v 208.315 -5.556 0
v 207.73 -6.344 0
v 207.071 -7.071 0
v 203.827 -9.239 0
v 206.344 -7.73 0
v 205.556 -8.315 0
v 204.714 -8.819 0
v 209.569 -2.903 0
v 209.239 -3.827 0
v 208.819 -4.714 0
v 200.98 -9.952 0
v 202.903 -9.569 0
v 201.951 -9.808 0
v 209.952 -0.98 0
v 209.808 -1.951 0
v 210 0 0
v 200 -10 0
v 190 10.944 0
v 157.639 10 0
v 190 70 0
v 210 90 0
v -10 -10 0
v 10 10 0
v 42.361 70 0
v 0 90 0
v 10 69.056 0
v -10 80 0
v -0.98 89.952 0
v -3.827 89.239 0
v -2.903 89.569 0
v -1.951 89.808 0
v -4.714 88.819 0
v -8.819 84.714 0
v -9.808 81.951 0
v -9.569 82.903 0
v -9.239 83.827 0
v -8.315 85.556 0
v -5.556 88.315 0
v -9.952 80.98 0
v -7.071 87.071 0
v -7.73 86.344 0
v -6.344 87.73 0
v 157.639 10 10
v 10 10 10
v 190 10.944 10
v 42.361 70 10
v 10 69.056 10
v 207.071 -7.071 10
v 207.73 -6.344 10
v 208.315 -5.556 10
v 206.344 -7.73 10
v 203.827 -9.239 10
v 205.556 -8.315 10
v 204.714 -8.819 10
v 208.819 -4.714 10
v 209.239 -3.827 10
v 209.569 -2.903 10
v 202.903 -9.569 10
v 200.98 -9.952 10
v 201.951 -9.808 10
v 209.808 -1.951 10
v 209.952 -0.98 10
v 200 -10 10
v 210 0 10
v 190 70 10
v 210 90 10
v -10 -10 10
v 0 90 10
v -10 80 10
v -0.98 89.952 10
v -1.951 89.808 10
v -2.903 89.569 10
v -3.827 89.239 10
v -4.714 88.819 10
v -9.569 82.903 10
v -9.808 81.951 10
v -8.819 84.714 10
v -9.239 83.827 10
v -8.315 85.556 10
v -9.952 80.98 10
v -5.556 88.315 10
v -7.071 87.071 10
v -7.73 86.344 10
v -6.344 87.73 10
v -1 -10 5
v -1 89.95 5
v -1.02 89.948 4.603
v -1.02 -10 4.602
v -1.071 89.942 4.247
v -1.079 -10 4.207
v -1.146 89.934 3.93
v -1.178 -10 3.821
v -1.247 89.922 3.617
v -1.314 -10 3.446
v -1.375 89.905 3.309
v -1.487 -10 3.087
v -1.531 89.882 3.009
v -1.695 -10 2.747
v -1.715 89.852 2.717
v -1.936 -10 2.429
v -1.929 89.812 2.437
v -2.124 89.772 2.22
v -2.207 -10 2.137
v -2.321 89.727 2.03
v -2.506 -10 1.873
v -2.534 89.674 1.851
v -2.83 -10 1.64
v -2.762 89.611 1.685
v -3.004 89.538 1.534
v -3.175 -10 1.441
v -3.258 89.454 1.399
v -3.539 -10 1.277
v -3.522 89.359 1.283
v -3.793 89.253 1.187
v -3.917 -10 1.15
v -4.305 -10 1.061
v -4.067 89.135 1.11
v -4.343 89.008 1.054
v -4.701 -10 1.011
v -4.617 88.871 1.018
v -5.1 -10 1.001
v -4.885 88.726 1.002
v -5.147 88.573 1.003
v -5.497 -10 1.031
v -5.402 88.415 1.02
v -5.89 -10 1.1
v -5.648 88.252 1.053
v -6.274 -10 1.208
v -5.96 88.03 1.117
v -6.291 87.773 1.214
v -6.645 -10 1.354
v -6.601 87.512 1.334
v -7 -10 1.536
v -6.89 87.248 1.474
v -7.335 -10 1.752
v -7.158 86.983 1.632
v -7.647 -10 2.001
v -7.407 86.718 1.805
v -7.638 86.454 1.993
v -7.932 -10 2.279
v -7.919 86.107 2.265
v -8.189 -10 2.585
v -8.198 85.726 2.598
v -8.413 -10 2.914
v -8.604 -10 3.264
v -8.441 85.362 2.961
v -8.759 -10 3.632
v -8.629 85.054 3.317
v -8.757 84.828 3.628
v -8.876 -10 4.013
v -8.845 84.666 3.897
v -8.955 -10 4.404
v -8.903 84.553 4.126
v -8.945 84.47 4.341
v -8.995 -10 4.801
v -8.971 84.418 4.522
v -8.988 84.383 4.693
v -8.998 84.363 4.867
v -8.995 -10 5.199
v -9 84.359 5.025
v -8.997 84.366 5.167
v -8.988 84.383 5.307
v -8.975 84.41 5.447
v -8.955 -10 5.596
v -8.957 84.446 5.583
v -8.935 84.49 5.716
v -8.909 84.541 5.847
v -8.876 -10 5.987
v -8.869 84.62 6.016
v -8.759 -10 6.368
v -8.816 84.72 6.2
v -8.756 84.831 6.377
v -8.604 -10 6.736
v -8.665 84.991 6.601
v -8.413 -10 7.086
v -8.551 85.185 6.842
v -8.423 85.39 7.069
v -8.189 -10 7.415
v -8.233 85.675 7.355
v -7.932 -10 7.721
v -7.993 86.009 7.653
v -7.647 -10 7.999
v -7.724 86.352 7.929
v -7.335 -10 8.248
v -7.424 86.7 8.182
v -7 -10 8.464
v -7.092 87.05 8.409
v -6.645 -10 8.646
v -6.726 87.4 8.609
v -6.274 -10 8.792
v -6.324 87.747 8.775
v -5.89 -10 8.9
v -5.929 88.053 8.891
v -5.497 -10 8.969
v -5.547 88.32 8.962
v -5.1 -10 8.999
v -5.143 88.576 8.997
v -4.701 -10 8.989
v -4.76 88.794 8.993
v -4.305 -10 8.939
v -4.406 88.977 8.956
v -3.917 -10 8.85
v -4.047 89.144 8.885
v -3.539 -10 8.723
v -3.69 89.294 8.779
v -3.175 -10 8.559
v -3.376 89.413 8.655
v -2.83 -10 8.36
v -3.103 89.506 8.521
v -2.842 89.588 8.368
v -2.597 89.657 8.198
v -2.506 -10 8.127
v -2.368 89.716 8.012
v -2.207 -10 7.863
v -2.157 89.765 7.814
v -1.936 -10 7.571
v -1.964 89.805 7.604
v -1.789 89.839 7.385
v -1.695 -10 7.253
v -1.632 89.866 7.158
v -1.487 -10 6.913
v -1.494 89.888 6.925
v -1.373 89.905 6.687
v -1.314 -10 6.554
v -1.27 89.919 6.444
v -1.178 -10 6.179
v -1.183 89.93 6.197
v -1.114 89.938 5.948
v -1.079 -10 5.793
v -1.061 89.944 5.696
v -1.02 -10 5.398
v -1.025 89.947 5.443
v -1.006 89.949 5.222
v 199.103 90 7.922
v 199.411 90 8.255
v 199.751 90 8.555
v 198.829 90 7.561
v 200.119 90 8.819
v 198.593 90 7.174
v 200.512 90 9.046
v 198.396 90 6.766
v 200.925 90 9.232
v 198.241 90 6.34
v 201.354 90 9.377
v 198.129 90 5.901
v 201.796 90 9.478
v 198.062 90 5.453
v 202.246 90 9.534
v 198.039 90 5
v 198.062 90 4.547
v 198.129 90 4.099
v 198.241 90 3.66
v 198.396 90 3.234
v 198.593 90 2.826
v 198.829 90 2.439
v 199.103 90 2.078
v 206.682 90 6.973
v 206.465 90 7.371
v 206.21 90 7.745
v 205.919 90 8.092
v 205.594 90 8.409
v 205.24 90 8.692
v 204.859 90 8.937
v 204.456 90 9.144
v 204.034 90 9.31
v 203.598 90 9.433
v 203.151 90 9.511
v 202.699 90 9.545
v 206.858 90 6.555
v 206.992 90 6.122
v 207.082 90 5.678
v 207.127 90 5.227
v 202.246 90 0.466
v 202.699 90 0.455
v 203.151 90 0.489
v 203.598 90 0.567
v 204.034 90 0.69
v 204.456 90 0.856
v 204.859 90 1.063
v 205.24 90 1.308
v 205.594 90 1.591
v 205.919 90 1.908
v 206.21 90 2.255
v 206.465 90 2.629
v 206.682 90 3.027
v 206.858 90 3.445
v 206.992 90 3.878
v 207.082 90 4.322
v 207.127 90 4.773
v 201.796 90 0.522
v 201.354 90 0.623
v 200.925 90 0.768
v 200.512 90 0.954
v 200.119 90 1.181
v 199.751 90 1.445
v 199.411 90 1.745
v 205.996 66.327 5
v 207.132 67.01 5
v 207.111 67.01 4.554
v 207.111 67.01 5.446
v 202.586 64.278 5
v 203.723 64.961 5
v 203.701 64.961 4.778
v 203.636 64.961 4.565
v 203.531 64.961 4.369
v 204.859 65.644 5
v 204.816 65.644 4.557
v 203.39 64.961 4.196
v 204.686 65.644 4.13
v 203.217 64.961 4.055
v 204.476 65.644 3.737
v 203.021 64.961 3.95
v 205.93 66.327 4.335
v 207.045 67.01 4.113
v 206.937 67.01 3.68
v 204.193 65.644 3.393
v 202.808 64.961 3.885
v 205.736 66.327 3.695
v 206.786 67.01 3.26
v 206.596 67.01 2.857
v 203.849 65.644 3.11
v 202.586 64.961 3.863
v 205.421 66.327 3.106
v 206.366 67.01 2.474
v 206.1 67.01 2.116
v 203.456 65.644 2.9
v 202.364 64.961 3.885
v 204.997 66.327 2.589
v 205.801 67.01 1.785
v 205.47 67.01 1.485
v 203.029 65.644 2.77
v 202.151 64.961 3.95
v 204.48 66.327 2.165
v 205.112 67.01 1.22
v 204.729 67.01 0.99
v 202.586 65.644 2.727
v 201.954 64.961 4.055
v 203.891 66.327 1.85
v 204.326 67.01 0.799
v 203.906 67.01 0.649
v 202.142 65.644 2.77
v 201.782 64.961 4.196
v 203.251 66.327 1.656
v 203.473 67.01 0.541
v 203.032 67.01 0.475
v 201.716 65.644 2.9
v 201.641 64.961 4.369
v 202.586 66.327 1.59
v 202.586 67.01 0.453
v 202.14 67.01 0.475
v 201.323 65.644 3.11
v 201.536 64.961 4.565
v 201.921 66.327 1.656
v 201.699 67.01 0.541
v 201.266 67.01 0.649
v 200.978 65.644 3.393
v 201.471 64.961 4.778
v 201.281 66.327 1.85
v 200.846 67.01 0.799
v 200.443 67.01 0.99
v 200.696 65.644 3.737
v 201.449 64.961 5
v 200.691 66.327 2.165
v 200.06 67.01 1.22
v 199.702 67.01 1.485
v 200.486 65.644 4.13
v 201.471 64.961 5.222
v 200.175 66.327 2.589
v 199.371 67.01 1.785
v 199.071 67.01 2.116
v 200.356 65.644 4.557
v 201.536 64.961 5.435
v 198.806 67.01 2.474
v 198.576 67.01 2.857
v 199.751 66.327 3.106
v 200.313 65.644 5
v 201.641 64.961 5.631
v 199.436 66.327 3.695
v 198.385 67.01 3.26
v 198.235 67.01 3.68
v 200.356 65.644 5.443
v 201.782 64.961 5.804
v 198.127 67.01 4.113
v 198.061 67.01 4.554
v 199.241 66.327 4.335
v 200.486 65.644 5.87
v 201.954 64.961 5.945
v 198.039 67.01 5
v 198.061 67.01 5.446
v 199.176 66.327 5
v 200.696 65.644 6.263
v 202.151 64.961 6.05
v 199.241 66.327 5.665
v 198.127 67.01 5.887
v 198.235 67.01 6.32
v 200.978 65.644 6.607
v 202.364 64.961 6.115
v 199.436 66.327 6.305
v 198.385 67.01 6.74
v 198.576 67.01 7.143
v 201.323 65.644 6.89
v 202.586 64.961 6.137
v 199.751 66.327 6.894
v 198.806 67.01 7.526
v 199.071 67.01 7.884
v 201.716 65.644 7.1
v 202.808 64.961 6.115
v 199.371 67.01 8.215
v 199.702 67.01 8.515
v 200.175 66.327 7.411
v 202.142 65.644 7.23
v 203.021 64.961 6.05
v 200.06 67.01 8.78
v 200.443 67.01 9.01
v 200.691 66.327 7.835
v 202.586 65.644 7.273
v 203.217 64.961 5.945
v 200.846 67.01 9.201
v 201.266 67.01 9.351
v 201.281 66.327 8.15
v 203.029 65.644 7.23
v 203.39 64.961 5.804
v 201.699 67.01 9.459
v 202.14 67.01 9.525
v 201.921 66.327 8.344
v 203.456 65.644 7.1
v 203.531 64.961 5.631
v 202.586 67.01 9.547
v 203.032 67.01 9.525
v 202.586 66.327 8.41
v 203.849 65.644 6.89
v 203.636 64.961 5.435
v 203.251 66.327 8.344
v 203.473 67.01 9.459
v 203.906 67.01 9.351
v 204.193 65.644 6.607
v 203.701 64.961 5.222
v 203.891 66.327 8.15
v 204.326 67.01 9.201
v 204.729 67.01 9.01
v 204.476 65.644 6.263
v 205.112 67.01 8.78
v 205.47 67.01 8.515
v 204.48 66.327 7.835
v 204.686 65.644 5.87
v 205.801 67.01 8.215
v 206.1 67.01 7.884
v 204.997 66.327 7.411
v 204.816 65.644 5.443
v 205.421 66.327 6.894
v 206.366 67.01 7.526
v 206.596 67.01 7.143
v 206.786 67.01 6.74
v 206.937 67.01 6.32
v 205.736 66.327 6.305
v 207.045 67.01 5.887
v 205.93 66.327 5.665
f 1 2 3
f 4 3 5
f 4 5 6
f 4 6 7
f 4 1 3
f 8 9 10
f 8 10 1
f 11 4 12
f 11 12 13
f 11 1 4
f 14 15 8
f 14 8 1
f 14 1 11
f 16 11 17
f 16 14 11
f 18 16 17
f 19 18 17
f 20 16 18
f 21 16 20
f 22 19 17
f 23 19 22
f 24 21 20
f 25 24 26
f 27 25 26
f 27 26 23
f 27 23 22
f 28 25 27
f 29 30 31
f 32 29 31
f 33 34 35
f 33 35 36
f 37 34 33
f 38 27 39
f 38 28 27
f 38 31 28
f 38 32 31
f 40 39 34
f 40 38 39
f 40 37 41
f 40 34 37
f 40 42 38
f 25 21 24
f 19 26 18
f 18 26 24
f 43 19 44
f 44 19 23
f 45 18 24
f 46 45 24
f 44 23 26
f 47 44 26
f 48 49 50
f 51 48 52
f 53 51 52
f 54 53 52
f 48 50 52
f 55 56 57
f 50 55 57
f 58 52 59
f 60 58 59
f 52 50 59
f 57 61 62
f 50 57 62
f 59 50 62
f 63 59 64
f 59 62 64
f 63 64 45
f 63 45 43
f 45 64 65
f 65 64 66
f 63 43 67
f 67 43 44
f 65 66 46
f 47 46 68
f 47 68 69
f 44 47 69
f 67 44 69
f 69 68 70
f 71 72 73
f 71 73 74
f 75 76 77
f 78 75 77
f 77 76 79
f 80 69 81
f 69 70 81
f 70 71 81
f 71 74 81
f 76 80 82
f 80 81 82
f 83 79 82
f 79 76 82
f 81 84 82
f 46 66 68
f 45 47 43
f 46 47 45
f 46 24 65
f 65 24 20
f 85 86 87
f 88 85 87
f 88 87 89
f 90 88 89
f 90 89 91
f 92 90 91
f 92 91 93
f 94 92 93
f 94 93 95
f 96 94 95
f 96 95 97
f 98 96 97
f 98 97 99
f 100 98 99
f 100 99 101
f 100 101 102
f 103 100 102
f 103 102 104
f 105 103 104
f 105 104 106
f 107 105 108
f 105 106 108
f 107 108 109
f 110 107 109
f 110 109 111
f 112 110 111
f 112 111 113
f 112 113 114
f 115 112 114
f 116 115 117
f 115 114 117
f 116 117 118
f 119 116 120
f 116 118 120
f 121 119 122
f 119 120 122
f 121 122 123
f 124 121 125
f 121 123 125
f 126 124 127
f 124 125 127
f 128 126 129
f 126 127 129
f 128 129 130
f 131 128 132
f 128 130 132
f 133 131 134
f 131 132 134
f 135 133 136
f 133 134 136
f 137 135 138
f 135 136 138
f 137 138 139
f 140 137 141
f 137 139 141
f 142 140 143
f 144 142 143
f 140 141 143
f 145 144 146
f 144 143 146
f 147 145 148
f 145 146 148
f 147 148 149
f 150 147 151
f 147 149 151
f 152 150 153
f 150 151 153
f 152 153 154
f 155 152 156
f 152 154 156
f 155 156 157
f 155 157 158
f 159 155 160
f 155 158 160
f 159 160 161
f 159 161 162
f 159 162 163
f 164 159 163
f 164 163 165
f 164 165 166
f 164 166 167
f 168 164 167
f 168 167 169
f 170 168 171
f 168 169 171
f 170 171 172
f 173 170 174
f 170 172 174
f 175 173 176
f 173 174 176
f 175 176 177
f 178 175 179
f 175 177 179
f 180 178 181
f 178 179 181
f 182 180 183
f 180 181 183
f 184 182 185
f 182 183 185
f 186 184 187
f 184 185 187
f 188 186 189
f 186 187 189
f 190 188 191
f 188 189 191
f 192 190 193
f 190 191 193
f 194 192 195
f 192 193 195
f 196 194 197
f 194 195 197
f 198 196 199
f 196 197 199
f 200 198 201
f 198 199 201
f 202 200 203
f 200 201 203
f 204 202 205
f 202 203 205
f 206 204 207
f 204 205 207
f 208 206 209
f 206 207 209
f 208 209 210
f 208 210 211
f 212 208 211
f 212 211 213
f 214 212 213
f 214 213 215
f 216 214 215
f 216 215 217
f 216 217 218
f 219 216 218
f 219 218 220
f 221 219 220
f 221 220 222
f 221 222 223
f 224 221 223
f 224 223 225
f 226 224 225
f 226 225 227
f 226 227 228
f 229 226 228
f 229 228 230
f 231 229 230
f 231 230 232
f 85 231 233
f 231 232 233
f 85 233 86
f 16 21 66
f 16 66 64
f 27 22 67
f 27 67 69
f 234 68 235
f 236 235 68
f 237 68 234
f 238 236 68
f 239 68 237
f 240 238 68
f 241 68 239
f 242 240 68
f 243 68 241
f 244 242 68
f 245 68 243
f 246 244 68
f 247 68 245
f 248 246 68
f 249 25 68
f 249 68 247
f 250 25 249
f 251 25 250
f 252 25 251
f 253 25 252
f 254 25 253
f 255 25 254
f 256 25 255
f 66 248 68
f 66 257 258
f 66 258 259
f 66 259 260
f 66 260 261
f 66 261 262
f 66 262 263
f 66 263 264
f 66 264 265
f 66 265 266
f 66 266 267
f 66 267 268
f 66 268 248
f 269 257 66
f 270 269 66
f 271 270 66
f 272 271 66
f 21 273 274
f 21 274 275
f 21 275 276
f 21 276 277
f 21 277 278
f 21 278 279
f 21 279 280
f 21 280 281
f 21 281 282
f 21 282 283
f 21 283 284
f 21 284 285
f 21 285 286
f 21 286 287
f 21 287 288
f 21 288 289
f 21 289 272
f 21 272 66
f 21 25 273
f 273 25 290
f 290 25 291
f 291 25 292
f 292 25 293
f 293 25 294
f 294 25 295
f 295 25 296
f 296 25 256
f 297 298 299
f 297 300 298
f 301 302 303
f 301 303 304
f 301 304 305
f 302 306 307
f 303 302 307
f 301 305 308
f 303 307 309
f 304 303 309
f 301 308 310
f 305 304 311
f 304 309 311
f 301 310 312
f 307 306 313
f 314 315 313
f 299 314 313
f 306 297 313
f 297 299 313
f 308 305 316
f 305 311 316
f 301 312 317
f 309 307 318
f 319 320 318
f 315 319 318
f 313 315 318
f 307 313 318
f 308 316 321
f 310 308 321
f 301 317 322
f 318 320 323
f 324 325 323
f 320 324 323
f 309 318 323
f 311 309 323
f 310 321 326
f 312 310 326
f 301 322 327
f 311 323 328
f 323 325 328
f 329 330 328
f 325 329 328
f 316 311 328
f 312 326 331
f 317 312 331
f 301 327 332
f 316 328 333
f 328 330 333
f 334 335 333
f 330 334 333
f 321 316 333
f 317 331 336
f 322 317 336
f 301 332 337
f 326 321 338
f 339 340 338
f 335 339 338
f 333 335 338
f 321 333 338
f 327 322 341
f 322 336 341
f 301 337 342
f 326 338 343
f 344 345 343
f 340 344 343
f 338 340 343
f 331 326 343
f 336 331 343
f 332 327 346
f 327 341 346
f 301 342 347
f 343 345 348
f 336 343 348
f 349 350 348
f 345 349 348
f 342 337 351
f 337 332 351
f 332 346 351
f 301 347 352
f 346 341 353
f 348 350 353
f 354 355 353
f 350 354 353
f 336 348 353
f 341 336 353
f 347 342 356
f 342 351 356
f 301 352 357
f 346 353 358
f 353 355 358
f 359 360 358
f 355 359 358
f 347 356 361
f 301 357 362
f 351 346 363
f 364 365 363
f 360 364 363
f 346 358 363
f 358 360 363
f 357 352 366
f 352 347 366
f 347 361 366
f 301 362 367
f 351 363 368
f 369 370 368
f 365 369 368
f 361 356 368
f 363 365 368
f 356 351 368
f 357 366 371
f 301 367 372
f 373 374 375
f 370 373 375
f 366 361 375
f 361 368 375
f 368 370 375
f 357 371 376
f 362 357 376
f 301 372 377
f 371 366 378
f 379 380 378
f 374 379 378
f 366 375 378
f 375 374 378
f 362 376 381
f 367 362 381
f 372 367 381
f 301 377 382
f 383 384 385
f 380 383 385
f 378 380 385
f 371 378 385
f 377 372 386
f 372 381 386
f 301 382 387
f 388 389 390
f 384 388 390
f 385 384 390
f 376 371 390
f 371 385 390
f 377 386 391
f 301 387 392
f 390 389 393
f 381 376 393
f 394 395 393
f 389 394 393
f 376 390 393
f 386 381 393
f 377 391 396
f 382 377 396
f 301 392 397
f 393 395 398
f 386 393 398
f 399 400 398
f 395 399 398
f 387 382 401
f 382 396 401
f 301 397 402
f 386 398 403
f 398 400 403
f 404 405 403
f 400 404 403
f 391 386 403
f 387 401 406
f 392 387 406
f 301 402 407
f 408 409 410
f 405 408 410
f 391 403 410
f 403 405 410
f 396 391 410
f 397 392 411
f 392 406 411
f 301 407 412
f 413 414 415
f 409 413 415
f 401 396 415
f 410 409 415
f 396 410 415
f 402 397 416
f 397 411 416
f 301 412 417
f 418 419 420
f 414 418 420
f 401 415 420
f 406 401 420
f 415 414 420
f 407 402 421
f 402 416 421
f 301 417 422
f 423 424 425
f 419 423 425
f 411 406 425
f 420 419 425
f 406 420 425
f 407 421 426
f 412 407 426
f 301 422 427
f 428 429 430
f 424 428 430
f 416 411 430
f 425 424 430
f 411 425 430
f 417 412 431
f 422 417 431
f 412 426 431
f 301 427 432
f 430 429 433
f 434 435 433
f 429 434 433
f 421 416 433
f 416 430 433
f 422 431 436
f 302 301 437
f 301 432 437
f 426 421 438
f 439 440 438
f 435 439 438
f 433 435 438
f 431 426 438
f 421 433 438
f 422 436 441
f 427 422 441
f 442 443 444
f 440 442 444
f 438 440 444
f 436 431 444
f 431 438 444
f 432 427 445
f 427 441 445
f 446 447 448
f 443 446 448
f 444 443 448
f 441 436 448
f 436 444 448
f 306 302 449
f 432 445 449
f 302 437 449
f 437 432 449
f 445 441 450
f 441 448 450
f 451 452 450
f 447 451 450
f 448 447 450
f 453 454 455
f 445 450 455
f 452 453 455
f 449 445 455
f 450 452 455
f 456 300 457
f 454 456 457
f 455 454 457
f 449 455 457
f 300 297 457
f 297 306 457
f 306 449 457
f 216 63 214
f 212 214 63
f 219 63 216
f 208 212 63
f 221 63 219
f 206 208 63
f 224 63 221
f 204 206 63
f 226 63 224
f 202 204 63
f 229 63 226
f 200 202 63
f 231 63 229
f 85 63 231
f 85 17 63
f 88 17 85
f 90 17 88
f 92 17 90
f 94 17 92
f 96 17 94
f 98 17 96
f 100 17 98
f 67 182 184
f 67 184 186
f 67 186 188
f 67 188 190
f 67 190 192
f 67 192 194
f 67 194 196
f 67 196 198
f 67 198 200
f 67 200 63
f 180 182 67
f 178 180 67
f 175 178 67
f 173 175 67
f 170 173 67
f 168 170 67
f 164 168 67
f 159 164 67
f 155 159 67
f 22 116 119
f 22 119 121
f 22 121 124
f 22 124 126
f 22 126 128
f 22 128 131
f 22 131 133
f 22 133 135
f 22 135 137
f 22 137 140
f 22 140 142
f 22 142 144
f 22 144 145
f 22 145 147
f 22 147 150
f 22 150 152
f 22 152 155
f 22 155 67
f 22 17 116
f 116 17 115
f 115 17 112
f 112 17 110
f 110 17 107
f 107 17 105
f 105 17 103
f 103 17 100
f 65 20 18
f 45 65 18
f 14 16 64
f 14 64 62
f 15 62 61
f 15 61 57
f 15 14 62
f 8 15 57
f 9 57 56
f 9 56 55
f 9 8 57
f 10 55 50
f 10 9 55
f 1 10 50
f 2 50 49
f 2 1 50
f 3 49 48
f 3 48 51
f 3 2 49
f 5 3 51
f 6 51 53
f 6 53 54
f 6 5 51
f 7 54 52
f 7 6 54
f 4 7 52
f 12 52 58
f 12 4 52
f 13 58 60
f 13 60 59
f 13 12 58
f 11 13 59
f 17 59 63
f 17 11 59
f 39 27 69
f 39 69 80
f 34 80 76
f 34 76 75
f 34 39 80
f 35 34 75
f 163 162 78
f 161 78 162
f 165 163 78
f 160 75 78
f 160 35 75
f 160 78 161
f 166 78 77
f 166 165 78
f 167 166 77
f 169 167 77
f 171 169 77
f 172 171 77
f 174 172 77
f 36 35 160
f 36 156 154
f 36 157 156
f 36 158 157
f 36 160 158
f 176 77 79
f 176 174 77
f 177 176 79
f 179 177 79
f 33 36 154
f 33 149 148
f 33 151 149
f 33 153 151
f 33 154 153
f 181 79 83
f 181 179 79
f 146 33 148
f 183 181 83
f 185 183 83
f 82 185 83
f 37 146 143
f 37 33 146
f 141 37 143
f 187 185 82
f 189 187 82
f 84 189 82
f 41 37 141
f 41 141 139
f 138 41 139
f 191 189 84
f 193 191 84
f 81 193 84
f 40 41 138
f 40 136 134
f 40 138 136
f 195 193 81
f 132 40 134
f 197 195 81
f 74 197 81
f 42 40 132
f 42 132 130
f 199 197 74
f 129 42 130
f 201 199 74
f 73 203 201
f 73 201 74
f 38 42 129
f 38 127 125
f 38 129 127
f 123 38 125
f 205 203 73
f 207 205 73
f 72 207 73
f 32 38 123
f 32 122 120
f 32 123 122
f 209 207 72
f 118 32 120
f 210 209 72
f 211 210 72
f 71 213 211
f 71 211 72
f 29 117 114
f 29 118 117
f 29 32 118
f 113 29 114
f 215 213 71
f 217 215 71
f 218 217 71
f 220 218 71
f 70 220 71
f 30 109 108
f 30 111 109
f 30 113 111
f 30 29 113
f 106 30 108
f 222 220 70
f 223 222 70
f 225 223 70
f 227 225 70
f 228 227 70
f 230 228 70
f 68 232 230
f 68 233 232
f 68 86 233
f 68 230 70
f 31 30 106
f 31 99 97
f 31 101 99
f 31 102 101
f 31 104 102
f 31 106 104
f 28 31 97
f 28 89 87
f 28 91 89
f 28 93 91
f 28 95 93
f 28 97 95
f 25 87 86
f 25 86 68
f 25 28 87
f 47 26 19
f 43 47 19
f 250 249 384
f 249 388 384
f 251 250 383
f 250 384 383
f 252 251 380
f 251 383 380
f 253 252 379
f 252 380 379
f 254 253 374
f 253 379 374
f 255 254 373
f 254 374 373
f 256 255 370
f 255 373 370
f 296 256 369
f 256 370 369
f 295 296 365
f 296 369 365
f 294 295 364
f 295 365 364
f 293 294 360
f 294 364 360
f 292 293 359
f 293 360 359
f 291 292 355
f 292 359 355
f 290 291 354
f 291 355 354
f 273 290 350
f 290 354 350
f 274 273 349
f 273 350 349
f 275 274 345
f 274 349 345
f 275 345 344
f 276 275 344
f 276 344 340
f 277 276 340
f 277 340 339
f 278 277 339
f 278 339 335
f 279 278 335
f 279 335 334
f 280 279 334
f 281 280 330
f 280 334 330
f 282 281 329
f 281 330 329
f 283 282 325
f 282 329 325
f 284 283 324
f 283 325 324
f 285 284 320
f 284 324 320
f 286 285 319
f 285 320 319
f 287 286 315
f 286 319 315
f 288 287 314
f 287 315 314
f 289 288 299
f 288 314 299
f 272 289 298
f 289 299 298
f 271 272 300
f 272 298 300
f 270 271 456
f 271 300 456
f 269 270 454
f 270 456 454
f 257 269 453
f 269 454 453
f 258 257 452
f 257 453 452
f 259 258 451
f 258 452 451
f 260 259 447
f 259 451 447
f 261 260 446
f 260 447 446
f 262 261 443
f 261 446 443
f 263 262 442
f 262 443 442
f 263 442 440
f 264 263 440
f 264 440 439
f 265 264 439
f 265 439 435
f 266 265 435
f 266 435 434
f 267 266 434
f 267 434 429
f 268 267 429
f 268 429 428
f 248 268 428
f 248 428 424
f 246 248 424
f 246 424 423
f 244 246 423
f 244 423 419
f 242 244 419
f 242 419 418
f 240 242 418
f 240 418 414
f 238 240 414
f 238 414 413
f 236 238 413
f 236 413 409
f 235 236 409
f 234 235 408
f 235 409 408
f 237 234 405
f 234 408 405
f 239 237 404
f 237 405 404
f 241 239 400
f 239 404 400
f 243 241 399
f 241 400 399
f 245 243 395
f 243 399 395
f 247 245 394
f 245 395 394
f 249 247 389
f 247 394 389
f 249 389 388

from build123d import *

# Parameters (mm, degrees)
BOSS_EXTRUDE1_DEPTH              = 10
F_8_0_8_DIAMETER_HOLE1_D         = 8
F_1_8_27_NPSM_TAPPED_HOLE1_D     = 9.0932
F_1_8_27_NPSM_TAPPED_HOLE1_DEPTH = 22.99
F_1_8_27_NPSM_TAPPED_HOLE1_TIP   = 2.73187289


with BuildPart() as part:
    # Sketch1 → Boss-Extrude1 (new body)
    with BuildSketch(Plane.XY):
        with BuildLine():
            Line((-10, -10), (-10, 80))
            ThreePointArc((-10, 80), (-7.071067812, 87.071067812), (0, 90))
            Line((0, 90), (210, 90))
            Line((210, 90), (210, 0))
            ThreePointArc((210, 0), (207.071067812, -7.071067812), (200, -10))
            Line((200, -10), (-10, -10))
        make_face()
        Polygon((42.360679775, 70), (190, 70), (190, 10.94427191), align=None, mode=Mode.SUBTRACT)
        Polygon((10, 10), (10, 69.05572809), (157.639320225, 10), align=None, mode=Mode.SUBTRACT)
    extrude(amount=BOSS_EXTRUDE1_DEPTH)

    # Ø8.0 (8) Diameter Hole1 (through all)
    with Locations(Plane(origin=(0, -10, 0), x_dir=(-1, 0, 0), z_dir=(0, -1, 0))):
        with Locations((5, -5)):
            Hole(F_8_0_8_DIAMETER_HOLE1_D / 2)

    # 1/8-27 NPSM Tapped Hole1
    with Locations(Plane(origin=(0, 90, 0), x_dir=(1, 0, 0), z_dir=(0, 1, 0))):
        with Locations((202.585893874, -5)):
            Hole(F_1_8_27_NPSM_TAPPED_HOLE1_D / 2, depth=F_1_8_27_NPSM_TAPPED_HOLE1_DEPTH)
            with Locations((0, 0, -(F_1_8_27_NPSM_TAPPED_HOLE1_DEPTH + F_1_8_27_NPSM_TAPPED_HOLE1_TIP / 2))):  # 118° drill point
                Cone(0, F_1_8_27_NPSM_TAPPED_HOLE1_D / 2, F_1_8_27_NPSM_TAPPED_HOLE1_TIP, mode=Mode.SUBTRACT)


solid = part.part
